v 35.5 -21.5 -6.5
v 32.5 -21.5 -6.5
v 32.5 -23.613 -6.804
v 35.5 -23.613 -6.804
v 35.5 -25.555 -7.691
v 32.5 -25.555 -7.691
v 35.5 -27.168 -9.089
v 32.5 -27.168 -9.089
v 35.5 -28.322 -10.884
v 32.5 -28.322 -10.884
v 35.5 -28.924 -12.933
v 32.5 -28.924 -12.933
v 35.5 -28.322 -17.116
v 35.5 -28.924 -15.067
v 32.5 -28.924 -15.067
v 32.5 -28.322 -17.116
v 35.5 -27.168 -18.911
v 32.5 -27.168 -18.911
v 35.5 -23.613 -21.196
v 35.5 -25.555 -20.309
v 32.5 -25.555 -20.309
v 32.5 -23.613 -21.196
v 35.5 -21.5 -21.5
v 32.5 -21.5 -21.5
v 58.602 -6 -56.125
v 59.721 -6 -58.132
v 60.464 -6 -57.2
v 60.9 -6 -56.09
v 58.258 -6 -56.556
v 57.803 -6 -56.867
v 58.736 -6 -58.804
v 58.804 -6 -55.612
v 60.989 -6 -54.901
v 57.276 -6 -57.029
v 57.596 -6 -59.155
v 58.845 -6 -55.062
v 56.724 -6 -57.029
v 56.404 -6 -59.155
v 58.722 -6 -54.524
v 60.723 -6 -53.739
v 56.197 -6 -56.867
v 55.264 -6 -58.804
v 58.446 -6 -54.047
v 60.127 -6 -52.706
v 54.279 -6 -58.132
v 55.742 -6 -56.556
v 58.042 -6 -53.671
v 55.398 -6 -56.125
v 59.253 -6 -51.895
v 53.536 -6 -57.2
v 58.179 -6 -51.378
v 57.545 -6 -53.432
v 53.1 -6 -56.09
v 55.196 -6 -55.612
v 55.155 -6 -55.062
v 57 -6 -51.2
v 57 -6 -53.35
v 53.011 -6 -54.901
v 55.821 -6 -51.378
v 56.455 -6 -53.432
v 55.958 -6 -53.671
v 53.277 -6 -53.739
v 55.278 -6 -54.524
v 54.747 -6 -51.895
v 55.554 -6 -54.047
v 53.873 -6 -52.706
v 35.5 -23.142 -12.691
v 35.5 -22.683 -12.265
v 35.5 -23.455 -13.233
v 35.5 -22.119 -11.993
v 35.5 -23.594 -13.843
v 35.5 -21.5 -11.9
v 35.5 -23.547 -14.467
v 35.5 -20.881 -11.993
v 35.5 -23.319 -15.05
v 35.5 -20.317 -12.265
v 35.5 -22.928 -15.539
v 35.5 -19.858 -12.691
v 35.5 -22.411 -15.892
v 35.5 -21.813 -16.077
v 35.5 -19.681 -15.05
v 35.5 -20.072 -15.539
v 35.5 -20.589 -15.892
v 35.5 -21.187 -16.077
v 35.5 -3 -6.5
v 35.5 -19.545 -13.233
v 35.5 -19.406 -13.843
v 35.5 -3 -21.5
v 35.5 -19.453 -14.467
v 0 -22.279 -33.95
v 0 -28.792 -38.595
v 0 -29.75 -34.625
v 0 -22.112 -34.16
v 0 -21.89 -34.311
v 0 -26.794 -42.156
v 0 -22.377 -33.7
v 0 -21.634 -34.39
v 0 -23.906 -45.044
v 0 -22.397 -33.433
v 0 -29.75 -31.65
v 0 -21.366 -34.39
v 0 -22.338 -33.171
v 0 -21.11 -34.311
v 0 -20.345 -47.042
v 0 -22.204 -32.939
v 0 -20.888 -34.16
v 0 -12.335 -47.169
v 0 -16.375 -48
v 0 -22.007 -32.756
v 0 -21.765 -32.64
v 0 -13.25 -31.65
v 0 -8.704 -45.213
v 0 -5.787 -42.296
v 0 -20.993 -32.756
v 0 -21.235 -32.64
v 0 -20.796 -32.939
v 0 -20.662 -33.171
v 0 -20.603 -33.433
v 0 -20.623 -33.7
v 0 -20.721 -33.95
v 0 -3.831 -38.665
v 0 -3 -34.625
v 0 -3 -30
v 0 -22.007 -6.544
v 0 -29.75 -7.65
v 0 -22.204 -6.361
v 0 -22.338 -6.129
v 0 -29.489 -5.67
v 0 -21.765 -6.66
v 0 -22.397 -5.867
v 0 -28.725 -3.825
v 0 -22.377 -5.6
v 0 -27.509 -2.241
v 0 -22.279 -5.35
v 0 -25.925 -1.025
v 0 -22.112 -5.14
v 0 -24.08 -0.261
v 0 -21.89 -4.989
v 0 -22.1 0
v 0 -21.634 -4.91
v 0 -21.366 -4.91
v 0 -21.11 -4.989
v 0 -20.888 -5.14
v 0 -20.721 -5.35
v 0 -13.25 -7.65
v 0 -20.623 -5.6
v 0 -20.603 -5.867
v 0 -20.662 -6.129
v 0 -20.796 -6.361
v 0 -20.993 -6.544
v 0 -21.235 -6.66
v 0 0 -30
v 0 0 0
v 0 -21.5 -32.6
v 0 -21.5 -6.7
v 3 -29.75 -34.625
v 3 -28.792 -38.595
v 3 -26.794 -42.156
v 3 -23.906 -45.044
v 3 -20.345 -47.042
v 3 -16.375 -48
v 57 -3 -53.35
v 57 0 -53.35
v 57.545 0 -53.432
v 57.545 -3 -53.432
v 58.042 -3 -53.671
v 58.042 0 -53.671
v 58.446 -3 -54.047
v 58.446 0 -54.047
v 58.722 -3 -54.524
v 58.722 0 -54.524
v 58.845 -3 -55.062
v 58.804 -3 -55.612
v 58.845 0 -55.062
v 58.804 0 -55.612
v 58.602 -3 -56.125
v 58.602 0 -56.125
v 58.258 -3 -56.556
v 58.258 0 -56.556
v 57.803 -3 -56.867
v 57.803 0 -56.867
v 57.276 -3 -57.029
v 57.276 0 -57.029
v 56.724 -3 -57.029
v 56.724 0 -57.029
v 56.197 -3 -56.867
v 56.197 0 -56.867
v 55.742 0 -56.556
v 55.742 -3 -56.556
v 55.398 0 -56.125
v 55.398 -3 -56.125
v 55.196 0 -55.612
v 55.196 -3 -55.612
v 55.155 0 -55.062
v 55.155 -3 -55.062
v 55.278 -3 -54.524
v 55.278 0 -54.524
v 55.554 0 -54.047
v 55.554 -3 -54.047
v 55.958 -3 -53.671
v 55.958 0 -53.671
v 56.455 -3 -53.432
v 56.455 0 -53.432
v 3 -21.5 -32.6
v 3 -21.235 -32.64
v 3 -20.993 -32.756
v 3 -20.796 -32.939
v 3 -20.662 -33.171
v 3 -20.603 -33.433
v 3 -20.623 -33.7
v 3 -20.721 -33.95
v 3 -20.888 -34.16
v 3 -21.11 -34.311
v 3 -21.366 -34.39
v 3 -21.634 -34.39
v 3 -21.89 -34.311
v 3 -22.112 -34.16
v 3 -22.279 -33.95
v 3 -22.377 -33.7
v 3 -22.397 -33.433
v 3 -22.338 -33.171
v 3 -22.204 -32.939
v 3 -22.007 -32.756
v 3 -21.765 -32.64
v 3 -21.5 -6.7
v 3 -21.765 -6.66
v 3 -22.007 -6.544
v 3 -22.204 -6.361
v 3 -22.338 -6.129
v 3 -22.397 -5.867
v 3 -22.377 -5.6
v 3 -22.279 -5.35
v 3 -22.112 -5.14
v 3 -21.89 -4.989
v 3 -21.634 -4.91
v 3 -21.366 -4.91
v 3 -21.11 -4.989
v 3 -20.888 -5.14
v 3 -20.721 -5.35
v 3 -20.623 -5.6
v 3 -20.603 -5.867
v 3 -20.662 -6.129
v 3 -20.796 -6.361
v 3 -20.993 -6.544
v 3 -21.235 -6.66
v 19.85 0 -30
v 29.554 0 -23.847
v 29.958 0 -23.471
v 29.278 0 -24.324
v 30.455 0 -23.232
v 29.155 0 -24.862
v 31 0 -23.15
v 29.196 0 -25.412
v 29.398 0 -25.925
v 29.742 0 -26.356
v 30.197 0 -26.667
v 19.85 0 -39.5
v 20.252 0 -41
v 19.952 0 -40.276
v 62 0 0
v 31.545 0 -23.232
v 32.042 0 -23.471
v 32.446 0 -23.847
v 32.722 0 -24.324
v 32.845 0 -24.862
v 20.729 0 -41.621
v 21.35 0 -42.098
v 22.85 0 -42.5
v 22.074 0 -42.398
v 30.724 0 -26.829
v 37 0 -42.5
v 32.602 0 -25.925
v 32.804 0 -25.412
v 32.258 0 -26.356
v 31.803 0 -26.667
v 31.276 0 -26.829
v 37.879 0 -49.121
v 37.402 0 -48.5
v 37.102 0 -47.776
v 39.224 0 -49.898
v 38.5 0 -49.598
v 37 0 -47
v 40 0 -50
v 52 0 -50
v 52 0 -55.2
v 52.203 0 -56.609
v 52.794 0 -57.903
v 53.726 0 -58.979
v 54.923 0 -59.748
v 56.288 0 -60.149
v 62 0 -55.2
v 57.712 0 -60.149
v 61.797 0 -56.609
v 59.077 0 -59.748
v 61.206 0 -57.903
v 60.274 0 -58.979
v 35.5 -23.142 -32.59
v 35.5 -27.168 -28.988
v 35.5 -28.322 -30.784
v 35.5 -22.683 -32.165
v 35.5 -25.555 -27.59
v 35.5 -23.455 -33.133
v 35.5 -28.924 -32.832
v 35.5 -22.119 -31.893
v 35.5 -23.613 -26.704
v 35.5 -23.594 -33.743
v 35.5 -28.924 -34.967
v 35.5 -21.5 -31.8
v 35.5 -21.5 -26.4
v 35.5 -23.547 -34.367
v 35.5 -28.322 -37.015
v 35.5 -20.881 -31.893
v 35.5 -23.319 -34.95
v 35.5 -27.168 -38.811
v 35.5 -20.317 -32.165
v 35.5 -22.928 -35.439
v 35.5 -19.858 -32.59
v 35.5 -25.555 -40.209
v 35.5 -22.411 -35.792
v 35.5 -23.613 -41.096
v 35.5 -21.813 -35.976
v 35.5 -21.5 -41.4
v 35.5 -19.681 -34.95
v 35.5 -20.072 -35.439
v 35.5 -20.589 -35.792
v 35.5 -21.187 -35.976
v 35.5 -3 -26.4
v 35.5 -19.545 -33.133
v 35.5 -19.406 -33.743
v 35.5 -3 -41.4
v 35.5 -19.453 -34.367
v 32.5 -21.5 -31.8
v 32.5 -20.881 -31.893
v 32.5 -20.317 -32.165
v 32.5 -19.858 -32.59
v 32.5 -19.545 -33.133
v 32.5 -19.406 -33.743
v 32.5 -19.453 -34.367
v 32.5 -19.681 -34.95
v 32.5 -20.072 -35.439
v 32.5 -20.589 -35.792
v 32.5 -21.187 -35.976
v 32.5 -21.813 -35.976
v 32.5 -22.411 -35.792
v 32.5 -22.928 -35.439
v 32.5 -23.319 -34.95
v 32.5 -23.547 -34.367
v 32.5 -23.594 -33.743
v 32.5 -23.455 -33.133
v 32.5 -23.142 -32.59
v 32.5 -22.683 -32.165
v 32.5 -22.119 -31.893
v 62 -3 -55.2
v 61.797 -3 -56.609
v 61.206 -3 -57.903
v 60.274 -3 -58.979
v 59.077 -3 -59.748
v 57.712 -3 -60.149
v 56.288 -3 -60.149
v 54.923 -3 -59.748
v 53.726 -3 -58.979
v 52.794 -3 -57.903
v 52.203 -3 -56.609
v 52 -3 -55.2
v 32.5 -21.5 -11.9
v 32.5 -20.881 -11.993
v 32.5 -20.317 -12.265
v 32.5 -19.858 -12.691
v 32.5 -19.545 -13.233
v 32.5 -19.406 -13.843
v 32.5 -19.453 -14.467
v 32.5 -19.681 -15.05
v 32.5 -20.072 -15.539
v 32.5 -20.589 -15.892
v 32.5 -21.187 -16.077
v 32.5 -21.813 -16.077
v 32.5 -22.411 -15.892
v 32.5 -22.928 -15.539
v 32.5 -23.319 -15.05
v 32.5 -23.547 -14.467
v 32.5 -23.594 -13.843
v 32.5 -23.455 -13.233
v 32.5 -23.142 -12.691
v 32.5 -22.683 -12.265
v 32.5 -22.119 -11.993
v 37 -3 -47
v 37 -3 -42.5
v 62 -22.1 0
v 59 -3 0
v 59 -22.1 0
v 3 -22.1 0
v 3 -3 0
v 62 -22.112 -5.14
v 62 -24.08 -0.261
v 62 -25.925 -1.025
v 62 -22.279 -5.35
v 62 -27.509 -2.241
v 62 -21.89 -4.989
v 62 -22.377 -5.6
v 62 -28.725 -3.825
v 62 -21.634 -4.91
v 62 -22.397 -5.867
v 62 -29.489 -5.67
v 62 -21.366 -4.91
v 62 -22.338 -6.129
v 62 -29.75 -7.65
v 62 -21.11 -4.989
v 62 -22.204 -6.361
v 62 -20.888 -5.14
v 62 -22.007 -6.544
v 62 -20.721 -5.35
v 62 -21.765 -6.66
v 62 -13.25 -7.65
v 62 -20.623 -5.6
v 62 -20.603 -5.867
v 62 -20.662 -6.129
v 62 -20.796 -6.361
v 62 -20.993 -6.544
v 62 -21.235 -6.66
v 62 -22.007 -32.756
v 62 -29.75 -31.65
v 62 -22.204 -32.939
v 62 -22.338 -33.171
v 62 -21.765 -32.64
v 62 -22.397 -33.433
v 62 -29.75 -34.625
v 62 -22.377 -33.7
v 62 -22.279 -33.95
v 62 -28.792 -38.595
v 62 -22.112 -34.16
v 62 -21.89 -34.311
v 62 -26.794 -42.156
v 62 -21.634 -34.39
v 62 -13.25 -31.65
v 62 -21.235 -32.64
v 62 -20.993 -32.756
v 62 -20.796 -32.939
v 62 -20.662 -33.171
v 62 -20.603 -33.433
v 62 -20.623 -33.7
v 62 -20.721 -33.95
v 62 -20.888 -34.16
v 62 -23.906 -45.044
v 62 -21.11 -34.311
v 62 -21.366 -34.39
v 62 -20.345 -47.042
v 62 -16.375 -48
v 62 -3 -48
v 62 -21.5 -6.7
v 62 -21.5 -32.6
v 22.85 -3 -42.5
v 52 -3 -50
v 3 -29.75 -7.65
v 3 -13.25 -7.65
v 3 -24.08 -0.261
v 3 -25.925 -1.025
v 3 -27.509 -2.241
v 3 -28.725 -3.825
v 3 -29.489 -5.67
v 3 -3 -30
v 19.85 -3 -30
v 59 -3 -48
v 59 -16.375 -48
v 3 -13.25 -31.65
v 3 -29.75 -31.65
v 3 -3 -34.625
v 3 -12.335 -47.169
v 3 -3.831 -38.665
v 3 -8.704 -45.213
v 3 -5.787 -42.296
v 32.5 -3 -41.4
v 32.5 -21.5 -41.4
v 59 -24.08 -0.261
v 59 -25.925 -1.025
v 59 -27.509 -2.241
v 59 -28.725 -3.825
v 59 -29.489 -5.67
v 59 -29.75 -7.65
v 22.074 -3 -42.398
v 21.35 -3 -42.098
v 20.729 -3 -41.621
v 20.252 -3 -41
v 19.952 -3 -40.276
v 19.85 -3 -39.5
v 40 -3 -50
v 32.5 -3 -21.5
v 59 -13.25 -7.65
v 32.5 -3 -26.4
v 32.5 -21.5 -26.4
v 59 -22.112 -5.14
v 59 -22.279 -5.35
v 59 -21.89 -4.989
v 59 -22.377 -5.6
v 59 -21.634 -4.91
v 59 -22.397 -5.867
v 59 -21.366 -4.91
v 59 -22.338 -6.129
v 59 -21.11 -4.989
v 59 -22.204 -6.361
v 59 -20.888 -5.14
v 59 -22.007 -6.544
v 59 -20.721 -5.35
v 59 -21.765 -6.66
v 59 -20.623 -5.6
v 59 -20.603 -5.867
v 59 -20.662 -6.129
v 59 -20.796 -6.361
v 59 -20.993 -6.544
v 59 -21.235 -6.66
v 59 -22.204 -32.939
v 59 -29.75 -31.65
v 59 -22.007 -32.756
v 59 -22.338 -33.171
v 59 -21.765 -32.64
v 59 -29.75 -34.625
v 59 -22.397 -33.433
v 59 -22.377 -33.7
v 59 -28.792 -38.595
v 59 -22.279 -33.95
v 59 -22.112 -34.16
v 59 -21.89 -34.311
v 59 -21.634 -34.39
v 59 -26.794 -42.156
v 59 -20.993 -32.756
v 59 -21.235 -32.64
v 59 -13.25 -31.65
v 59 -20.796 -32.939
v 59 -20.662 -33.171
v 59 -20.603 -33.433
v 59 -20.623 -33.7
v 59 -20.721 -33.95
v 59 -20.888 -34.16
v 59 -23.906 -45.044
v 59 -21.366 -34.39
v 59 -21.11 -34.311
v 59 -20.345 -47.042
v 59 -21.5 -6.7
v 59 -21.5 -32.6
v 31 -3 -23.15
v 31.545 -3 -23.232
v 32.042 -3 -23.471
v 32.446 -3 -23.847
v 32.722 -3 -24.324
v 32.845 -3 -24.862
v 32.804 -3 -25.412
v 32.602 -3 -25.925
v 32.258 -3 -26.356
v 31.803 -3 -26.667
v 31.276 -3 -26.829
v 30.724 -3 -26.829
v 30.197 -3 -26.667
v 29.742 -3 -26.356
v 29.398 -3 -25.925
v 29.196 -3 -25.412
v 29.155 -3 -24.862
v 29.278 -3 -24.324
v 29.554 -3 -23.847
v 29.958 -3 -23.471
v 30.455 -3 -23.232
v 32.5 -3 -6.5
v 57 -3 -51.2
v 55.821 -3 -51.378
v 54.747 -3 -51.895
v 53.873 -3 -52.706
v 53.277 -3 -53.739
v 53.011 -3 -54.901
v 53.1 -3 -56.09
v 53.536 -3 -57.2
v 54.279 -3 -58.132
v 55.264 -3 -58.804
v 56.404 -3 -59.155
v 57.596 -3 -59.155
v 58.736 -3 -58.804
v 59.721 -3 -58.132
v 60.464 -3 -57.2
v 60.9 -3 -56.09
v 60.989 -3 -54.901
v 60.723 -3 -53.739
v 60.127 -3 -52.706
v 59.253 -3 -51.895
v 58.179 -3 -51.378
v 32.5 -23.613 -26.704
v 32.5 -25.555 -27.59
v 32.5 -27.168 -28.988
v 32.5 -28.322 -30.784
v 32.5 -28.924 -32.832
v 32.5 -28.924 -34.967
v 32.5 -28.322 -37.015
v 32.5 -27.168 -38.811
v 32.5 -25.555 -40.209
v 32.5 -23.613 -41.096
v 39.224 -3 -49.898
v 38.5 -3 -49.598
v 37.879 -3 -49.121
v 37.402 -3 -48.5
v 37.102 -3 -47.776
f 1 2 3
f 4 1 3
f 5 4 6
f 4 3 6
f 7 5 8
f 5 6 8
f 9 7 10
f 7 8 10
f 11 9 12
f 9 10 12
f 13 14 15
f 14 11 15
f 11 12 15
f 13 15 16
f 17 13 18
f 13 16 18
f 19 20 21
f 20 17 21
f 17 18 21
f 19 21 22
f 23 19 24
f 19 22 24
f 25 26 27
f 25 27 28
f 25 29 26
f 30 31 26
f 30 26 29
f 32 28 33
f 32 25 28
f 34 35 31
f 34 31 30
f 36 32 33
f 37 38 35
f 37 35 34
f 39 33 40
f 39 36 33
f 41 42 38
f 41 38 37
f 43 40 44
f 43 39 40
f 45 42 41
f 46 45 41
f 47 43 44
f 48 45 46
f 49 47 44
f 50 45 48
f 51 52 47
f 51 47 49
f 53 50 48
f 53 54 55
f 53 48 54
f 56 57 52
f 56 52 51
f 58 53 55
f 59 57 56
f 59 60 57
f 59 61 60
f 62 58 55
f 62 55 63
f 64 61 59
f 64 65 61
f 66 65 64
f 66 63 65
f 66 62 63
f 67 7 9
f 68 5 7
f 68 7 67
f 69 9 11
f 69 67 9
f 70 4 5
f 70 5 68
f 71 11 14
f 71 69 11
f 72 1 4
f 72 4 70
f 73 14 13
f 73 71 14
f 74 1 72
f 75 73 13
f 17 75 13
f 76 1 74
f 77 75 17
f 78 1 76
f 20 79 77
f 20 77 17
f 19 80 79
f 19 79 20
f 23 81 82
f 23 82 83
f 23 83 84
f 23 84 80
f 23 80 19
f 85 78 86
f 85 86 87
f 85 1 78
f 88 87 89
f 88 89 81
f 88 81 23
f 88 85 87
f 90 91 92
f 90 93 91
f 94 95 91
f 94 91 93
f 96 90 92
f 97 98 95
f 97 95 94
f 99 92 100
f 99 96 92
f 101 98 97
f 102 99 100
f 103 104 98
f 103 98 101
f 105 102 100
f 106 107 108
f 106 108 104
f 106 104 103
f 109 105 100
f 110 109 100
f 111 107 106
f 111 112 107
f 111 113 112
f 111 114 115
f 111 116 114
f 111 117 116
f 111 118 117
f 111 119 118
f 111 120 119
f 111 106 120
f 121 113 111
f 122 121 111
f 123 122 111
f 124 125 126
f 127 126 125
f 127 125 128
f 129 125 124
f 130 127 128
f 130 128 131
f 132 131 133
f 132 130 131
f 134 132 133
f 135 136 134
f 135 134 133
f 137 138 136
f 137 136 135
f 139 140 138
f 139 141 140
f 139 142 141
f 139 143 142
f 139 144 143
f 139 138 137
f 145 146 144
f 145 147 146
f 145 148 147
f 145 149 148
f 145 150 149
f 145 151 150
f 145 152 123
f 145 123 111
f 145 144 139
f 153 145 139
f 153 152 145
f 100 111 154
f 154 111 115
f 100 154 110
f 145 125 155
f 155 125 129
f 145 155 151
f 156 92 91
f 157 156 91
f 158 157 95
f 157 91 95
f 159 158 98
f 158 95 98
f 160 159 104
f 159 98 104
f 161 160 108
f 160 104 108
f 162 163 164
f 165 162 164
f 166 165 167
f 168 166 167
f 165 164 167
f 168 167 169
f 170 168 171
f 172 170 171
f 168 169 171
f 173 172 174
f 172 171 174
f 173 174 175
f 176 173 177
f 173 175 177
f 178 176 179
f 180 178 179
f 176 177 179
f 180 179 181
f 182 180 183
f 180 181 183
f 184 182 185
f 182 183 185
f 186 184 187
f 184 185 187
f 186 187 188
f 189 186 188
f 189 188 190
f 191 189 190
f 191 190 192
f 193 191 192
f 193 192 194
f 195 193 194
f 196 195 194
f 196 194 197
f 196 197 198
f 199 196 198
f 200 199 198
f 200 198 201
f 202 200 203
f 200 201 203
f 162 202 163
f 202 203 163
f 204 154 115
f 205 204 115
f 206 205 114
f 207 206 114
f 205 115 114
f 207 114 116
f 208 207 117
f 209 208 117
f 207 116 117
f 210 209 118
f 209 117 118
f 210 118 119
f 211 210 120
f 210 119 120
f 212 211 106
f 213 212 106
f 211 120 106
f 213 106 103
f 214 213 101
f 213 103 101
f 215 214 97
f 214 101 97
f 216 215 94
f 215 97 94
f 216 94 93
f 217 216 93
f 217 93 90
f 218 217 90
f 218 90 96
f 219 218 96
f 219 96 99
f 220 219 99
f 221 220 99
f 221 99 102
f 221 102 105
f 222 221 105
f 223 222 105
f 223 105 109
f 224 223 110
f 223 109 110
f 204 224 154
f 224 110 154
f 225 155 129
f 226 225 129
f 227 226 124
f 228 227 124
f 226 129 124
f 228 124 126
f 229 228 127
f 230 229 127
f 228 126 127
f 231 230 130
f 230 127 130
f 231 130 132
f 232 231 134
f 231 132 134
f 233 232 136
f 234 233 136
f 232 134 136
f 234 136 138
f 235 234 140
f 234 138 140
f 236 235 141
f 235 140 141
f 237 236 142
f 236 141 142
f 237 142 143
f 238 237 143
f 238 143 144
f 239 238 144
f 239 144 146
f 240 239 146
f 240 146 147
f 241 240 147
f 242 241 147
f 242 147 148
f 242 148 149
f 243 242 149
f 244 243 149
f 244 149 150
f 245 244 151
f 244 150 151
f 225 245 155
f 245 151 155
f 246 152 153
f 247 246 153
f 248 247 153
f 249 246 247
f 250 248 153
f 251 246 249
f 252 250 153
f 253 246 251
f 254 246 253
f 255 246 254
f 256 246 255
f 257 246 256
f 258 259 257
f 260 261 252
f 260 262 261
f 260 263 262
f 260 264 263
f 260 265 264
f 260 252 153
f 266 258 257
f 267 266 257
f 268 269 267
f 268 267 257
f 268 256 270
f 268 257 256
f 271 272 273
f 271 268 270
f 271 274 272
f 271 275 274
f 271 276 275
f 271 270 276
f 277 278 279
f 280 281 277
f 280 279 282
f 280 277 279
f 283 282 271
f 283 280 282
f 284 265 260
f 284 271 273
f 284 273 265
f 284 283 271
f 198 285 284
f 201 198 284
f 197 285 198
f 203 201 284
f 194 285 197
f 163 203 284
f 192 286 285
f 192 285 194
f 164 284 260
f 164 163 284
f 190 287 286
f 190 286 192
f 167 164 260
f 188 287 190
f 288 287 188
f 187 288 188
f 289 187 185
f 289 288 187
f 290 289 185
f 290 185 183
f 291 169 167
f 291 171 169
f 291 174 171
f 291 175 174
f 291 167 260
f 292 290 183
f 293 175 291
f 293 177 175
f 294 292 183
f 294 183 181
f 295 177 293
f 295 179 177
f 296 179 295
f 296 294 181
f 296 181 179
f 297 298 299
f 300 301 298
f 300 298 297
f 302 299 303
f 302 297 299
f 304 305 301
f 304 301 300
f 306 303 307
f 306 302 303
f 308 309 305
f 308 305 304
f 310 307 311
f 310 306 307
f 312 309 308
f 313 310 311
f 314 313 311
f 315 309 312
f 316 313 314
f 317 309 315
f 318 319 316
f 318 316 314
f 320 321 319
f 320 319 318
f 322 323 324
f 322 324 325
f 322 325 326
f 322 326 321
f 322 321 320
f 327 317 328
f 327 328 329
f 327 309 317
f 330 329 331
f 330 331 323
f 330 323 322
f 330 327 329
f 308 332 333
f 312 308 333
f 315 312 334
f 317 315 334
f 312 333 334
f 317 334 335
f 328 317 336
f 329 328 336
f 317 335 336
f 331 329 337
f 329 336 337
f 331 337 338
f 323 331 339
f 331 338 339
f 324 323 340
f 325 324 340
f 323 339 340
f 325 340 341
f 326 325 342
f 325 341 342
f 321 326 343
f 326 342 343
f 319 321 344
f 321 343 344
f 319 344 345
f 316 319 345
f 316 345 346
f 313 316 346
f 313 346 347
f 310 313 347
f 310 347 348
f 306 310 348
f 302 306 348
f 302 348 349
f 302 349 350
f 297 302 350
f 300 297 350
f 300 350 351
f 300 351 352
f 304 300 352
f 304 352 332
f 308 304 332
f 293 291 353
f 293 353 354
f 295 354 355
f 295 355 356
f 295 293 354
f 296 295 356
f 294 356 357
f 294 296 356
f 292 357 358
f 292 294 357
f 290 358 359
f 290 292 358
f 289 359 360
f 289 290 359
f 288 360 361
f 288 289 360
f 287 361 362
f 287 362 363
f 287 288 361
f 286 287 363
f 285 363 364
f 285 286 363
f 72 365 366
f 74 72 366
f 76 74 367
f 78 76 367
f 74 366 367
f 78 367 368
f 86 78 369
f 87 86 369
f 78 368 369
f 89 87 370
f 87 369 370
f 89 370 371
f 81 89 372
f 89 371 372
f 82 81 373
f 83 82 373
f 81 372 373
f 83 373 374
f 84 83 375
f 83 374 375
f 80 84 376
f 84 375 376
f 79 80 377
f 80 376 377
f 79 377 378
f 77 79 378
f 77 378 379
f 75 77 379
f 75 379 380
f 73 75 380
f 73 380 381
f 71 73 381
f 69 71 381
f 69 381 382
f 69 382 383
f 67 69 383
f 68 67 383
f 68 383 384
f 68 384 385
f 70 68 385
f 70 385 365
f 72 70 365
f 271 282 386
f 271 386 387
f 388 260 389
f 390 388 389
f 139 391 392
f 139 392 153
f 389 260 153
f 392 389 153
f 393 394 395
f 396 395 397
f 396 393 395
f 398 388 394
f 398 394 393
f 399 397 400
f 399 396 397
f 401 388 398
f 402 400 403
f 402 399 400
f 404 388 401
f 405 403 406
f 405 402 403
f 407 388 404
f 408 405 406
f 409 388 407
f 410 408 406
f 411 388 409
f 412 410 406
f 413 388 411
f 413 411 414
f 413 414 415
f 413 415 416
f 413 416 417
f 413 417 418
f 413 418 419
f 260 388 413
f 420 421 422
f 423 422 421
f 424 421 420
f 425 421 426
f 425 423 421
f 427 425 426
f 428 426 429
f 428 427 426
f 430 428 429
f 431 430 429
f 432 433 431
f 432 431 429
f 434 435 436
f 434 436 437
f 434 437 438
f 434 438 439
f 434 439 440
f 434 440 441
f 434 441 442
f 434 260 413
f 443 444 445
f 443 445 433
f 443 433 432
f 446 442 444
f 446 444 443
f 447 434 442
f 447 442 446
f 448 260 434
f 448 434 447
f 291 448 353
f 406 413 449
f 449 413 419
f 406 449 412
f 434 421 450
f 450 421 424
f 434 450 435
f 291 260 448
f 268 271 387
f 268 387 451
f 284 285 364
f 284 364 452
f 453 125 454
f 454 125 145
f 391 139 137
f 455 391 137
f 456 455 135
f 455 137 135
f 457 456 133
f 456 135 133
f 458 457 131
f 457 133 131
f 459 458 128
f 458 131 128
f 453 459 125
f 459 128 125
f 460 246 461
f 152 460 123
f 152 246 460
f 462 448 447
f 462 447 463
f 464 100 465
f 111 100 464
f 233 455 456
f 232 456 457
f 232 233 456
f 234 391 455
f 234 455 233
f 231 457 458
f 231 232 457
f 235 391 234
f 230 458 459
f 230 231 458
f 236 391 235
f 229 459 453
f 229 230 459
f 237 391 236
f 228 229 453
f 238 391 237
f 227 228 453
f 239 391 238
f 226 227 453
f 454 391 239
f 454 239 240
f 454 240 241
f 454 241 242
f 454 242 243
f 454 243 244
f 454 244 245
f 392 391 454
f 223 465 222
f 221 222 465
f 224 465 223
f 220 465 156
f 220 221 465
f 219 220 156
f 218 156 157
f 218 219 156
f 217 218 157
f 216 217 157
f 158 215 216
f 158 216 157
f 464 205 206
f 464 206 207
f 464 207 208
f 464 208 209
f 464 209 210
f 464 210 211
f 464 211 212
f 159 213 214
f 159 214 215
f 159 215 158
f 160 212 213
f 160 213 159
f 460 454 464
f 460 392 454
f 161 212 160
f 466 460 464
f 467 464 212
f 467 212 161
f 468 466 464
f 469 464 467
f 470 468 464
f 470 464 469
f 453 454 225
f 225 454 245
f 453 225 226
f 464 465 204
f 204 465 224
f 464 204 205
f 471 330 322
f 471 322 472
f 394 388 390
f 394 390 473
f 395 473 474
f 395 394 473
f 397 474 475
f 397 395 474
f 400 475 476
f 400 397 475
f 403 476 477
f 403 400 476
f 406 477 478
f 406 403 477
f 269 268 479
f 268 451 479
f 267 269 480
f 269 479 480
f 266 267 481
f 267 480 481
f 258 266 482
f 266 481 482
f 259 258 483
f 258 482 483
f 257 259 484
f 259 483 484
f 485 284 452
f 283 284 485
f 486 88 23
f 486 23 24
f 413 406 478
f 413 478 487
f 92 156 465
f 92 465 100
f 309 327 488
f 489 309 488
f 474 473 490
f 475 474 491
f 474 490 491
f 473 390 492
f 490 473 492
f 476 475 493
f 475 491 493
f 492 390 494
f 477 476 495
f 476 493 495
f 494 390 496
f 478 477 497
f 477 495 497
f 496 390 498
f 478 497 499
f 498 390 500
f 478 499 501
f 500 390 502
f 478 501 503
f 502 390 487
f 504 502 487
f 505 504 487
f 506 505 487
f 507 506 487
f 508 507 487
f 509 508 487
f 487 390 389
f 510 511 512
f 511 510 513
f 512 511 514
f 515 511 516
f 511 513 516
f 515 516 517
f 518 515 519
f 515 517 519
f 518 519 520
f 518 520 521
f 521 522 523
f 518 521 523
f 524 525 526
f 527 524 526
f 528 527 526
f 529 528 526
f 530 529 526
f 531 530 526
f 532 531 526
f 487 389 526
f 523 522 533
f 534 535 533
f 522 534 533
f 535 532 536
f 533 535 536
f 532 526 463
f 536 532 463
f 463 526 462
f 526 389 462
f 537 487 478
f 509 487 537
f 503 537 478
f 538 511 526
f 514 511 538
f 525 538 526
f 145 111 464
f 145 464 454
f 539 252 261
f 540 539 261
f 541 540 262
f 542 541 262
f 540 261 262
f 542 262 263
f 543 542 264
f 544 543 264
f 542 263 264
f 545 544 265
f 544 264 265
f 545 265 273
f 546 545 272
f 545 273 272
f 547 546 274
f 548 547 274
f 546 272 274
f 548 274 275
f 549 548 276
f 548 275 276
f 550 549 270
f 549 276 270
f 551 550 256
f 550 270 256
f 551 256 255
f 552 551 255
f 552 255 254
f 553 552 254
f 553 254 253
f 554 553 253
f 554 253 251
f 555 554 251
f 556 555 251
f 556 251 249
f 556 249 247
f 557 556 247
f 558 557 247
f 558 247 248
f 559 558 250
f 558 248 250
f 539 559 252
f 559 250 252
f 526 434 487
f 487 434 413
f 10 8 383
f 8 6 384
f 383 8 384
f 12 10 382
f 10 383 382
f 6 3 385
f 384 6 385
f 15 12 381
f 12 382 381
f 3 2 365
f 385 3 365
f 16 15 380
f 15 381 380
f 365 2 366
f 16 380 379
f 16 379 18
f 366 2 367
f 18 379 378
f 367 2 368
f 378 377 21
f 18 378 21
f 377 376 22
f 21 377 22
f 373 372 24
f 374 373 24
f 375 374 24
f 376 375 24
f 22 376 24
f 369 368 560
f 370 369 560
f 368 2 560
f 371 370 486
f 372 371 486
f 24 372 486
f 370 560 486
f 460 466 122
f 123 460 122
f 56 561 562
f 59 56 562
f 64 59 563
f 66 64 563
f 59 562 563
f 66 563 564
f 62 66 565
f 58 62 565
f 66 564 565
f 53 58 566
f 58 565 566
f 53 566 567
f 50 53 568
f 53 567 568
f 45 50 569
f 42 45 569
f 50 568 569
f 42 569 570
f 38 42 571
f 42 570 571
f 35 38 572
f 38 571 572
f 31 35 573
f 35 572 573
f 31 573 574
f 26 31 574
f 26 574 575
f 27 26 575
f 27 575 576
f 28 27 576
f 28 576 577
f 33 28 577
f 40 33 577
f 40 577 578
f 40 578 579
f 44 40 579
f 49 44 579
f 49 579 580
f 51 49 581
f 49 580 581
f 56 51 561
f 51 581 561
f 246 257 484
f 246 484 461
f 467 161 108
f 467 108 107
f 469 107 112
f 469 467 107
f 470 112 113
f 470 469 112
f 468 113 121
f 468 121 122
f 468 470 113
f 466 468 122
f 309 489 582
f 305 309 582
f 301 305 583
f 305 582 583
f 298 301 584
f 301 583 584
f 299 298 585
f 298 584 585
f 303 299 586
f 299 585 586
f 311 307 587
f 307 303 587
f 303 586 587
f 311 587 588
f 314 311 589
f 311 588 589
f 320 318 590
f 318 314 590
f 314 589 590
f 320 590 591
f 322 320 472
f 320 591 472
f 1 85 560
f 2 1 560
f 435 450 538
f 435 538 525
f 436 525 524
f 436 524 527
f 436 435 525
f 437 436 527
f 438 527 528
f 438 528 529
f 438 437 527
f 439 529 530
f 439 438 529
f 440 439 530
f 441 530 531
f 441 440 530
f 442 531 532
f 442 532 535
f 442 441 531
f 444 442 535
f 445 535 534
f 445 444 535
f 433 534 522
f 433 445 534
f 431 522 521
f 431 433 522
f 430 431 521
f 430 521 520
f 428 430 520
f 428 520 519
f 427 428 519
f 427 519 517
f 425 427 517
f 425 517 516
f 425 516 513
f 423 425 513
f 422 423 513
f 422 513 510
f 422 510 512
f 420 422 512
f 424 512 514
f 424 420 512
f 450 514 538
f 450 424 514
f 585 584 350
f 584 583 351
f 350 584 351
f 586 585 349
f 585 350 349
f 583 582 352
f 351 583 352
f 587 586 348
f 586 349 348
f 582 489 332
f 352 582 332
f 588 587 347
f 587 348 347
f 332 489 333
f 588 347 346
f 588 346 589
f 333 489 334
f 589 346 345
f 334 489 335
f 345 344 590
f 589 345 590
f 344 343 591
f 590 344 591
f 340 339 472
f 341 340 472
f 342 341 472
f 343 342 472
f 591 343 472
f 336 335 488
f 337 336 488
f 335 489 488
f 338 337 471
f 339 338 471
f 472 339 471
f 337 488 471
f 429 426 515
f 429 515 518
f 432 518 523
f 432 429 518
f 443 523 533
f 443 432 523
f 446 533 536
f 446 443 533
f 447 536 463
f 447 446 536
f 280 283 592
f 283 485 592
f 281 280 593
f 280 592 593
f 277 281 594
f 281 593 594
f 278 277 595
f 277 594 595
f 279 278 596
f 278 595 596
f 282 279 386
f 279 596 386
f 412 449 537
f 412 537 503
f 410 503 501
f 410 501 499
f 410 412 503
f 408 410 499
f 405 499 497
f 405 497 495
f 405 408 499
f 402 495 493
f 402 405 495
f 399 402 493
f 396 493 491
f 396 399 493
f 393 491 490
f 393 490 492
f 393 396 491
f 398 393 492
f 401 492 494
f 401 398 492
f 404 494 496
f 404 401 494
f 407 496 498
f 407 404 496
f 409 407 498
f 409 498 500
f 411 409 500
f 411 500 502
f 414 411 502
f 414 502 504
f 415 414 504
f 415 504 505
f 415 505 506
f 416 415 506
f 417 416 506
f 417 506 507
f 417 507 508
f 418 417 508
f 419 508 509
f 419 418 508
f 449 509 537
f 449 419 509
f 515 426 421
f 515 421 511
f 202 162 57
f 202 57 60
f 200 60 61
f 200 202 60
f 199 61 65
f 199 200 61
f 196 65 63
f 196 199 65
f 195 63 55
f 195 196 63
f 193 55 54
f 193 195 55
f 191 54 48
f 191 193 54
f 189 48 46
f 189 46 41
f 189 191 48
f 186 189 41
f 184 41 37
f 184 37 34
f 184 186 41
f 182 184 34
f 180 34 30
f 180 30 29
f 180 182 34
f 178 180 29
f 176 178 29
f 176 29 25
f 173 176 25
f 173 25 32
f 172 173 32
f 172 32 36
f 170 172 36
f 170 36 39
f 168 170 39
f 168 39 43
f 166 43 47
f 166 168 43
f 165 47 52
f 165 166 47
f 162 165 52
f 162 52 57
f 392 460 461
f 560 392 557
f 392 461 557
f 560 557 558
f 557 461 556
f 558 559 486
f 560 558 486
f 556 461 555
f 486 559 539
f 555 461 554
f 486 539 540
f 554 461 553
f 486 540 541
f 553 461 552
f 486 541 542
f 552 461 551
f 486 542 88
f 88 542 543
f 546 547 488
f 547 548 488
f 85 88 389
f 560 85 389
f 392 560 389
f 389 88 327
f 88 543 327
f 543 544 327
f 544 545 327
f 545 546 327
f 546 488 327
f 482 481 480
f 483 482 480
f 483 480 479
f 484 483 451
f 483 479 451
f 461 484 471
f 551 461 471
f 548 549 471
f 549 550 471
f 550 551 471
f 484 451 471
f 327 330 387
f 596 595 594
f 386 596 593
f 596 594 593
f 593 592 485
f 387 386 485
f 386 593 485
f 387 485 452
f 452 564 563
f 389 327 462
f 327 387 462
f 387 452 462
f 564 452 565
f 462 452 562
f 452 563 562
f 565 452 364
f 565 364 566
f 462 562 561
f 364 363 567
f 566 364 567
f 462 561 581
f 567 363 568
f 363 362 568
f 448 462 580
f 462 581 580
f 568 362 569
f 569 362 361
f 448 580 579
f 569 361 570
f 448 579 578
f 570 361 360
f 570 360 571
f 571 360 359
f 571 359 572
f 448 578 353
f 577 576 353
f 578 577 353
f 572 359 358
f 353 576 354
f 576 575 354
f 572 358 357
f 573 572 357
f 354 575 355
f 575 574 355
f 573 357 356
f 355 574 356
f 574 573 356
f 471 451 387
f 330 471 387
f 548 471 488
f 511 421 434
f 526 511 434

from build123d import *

# Parameters (mm, degrees)
SKETCH1_R               = 1.85
BOSS_EXTRUDE1_DEPTH     = 3
SKETCH2_W               = 3
SKETCH2_H               = 48
BOSS_EXTRUDE2_DEPTH     = 26.75
SKETCH4_W               = 24
SKETCH4_H               = 16.5
SKETCH4_R               = 0.9
CUT_EXTRUDE3_DEPTH      = 3
CUT_EXTRUDE4_DEPTH      = 92.395308961
CUT_EXTRUDE4_DEPTH_BACK = 3
SKETCH6_W               = 3
SKETCH6_H               = 15
BOSS_EXTRUDE3_DEPTH     = 26.75
CUT_EXTRUDE5_DEPTH      = 6
SKETCH8_R               = 2.1
CUT_EXTRUDE6_DEPTH      = 6
FILLET2_R               = 3
SKETCH10_R              = 4
SKETCH10_R_2            = 1.85
BOSS_EXTRUDE4_DEPTH     = 3


with BuildPart() as part:
    # Sketch1 → Boss-Extrude1 (new body)
    with BuildSketch(Plane(origin=(0, 0, 0), x_dir=(1, 0, 0), z_dir=(0, 1, 0))):
        with BuildLine():
            Line((52, 55.2), (52, 50))
            Line((52, 50), (37, 50))
            Line((37, 50), (37, 42.5))
            Line((37, 42.5), (19.85, 42.5))
            Line((19.85, 42.5), (19.85, 30))
            Line((19.85, 30), (0, 30))
            Line((0, 30), (0, 0))
            Line((0, 0), (62, 0))
            Line((62, 0), (62, 50))
            Line((62, 50), (62, 55.2))
            ThreePointArc((62, 55.2), (57, 60.2), (52, 55.2))
        make_face()
        with Locations(Location((31, 25, 0), (0, 0, 270))):
            Circle(SKETCH1_R, mode=Mode.SUBTRACT)
        with Locations(Location((57, 55.2, 0), (0, 0, 270))):
            Circle(SKETCH1_R, mode=Mode.SUBTRACT)
    extrude(amount=-BOSS_EXTRUDE1_DEPTH)

    # Sketch2 → Boss-Extrude2 (add)
    with BuildSketch(Plane(origin=(0, -3, 0), x_dir=(-1, 0, 0), z_dir=(0, -1, 0))):
        with Locations((-60.5, 24)):
            Rectangle(SKETCH2_W, SKETCH2_H)
        with Locations((-1.5, 24)):
            Rectangle(SKETCH2_W, SKETCH2_H)
    extrude(amount=BOSS_EXTRUDE2_DEPTH)

    # Sketch4 → Cut-Extrude3 (cut)
    with BuildSketch(Plane.ZY.offset(-62)):
        with BuildLine():
            Line((-48, -29.75), (-34.625, -29.75))
            ThreePointArc((-34.625, -29.75), (-43.69937868, -25.44937868), (-48, -16.375))
            Line((-48, -16.375), (-48, -29.75))
        make_face()
        with Locations((-19.65, -21.5)):
            Rectangle(SKETCH4_W, SKETCH4_H)
        with BuildLine():
            ThreePointArc((0, -22.1), (-2.240633124, -27.509366876), (-7.65, -29.75))
            Line((-7.65, -29.75), (0, -29.75))
            Line((0, -29.75), (0, -22.1))
        make_face()
        with Locations((-33.5, -21.5)):
            Circle(SKETCH4_R)
        with Locations(Location((-5.8, -21.5, 0), (0, 0, 180))):
            Circle(SKETCH4_R)
    cut_extrude3 = extrude(amount=CUT_EXTRUDE3_DEPTH, mode=Mode.SUBTRACT)

    # Mirror2: Cut-Extrude3 across plane
    add(cut_extrude3.mirror(Plane(origin=(31, 0, 0), x_dir=(0, 0, 1), z_dir=(1, 0, 0))), mode=Mode.SUBTRACT)

    # Sketch5 → Cut-Extrude4 (cut, two sides: drawn at the far end of the back side and taken through both)
    with BuildSketch(Plane.ZY.offset(-CUT_EXTRUDE4_DEPTH_BACK)):
        with BuildLine():
            Line((-48, -3), (-48, -16.375))
            ThreePointArc((-48, -16.375), (-43.861015127, -7.138984873), (-34.625, -3))
            Line((-34.625, -3), (-48, -3))
        make_face()
    extrude(amount=CUT_EXTRUDE4_DEPTH + CUT_EXTRUDE4_DEPTH_BACK, mode=Mode.SUBTRACT)

    # Sketch6 → Boss-Extrude3 (add)
    with BuildSketch(Plane(origin=(0, -3, 0), x_dir=(-1, 0, 0), z_dir=(0, -1, 0))):
        with Locations((-34, 33.899748742)):
            Rectangle(SKETCH6_W, SKETCH6_H)
        with Locations((-34, 14)):
            Rectangle(SKETCH6_W, SKETCH6_H)
    extrude(amount=BOSS_EXTRUDE3_DEPTH)

    # Sketch7 → Cut-Extrude5 (cut)
    with BuildSketch(Plane.ZY.offset(-32.5)):
        with BuildLine():
            Line((-6.5, -29.75), (-6.5, -21.5))
            ThreePointArc((-6.5, -21.5), (-14, -29), (-21.5, -21.5))
            Line((-21.5, -21.5), (-21.5, -29.75))
            Line((-21.5, -29.75), (-6.5, -29.75))
        make_face()
        with BuildLine():
            ThreePointArc((-16.1, -21.5), (-14, -23.6), (-11.9, -21.5))
            Line((-11.9, -21.5), (-16.1, -21.5))
        make_face()
        with BuildLine():
            Line((-16.1, -21.5), (-11.9, -21.5))
            ThreePointArc((-11.9, -21.5), (-14, -19.4), (-16.1, -21.5))
        make_face()
    extrude(amount=-CUT_EXTRUDE5_DEPTH, mode=Mode.SUBTRACT)

    # Sketch8 → Cut-Extrude6 (cut)
    with BuildSketch(Plane.ZY.offset(-32.5)):
        with Locations((-33.899748742, -21.5)):
            Circle(SKETCH8_R)
        with BuildLine():
            ThreePointArc((-26.399748742, -21.5), (-33.899748742, -29), (-41.399748742, -21.5))
            Line((-41.399748742, -21.5), (-41.399748742, -29.75))
            Line((-41.399748742, -29.75), (-26.399748742, -29.75))
            Line((-26.399748742, -29.75), (-26.399748742, -21.5))
        make_face()
    extrude(amount=-CUT_EXTRUDE6_DEPTH, mode=Mode.SUBTRACT)

    # Fillet2
    fillet2_edges = [part.edges().sort_by_distance(p)[0] for p in [
        (19.85, -1.5, -42.5),
        (37, -1.5, -50),
    ]]
    fillet(fillet2_edges, radius=FILLET2_R)

    # Sketch10 → Boss-Extrude4 (add)
    with BuildSketch(Plane.XZ.offset(3)):
        with Locations(Location((57, -55.2, 0), (0, 0, 90))):
            Circle(SKETCH10_R)
        with Locations(Location((57, -55.2, 0), (0, 0, 90))):
            Circle(SKETCH10_R_2, mode=Mode.SUBTRACT)
    extrude(amount=BOSS_EXTRUDE4_DEPTH)


solid = part.part
